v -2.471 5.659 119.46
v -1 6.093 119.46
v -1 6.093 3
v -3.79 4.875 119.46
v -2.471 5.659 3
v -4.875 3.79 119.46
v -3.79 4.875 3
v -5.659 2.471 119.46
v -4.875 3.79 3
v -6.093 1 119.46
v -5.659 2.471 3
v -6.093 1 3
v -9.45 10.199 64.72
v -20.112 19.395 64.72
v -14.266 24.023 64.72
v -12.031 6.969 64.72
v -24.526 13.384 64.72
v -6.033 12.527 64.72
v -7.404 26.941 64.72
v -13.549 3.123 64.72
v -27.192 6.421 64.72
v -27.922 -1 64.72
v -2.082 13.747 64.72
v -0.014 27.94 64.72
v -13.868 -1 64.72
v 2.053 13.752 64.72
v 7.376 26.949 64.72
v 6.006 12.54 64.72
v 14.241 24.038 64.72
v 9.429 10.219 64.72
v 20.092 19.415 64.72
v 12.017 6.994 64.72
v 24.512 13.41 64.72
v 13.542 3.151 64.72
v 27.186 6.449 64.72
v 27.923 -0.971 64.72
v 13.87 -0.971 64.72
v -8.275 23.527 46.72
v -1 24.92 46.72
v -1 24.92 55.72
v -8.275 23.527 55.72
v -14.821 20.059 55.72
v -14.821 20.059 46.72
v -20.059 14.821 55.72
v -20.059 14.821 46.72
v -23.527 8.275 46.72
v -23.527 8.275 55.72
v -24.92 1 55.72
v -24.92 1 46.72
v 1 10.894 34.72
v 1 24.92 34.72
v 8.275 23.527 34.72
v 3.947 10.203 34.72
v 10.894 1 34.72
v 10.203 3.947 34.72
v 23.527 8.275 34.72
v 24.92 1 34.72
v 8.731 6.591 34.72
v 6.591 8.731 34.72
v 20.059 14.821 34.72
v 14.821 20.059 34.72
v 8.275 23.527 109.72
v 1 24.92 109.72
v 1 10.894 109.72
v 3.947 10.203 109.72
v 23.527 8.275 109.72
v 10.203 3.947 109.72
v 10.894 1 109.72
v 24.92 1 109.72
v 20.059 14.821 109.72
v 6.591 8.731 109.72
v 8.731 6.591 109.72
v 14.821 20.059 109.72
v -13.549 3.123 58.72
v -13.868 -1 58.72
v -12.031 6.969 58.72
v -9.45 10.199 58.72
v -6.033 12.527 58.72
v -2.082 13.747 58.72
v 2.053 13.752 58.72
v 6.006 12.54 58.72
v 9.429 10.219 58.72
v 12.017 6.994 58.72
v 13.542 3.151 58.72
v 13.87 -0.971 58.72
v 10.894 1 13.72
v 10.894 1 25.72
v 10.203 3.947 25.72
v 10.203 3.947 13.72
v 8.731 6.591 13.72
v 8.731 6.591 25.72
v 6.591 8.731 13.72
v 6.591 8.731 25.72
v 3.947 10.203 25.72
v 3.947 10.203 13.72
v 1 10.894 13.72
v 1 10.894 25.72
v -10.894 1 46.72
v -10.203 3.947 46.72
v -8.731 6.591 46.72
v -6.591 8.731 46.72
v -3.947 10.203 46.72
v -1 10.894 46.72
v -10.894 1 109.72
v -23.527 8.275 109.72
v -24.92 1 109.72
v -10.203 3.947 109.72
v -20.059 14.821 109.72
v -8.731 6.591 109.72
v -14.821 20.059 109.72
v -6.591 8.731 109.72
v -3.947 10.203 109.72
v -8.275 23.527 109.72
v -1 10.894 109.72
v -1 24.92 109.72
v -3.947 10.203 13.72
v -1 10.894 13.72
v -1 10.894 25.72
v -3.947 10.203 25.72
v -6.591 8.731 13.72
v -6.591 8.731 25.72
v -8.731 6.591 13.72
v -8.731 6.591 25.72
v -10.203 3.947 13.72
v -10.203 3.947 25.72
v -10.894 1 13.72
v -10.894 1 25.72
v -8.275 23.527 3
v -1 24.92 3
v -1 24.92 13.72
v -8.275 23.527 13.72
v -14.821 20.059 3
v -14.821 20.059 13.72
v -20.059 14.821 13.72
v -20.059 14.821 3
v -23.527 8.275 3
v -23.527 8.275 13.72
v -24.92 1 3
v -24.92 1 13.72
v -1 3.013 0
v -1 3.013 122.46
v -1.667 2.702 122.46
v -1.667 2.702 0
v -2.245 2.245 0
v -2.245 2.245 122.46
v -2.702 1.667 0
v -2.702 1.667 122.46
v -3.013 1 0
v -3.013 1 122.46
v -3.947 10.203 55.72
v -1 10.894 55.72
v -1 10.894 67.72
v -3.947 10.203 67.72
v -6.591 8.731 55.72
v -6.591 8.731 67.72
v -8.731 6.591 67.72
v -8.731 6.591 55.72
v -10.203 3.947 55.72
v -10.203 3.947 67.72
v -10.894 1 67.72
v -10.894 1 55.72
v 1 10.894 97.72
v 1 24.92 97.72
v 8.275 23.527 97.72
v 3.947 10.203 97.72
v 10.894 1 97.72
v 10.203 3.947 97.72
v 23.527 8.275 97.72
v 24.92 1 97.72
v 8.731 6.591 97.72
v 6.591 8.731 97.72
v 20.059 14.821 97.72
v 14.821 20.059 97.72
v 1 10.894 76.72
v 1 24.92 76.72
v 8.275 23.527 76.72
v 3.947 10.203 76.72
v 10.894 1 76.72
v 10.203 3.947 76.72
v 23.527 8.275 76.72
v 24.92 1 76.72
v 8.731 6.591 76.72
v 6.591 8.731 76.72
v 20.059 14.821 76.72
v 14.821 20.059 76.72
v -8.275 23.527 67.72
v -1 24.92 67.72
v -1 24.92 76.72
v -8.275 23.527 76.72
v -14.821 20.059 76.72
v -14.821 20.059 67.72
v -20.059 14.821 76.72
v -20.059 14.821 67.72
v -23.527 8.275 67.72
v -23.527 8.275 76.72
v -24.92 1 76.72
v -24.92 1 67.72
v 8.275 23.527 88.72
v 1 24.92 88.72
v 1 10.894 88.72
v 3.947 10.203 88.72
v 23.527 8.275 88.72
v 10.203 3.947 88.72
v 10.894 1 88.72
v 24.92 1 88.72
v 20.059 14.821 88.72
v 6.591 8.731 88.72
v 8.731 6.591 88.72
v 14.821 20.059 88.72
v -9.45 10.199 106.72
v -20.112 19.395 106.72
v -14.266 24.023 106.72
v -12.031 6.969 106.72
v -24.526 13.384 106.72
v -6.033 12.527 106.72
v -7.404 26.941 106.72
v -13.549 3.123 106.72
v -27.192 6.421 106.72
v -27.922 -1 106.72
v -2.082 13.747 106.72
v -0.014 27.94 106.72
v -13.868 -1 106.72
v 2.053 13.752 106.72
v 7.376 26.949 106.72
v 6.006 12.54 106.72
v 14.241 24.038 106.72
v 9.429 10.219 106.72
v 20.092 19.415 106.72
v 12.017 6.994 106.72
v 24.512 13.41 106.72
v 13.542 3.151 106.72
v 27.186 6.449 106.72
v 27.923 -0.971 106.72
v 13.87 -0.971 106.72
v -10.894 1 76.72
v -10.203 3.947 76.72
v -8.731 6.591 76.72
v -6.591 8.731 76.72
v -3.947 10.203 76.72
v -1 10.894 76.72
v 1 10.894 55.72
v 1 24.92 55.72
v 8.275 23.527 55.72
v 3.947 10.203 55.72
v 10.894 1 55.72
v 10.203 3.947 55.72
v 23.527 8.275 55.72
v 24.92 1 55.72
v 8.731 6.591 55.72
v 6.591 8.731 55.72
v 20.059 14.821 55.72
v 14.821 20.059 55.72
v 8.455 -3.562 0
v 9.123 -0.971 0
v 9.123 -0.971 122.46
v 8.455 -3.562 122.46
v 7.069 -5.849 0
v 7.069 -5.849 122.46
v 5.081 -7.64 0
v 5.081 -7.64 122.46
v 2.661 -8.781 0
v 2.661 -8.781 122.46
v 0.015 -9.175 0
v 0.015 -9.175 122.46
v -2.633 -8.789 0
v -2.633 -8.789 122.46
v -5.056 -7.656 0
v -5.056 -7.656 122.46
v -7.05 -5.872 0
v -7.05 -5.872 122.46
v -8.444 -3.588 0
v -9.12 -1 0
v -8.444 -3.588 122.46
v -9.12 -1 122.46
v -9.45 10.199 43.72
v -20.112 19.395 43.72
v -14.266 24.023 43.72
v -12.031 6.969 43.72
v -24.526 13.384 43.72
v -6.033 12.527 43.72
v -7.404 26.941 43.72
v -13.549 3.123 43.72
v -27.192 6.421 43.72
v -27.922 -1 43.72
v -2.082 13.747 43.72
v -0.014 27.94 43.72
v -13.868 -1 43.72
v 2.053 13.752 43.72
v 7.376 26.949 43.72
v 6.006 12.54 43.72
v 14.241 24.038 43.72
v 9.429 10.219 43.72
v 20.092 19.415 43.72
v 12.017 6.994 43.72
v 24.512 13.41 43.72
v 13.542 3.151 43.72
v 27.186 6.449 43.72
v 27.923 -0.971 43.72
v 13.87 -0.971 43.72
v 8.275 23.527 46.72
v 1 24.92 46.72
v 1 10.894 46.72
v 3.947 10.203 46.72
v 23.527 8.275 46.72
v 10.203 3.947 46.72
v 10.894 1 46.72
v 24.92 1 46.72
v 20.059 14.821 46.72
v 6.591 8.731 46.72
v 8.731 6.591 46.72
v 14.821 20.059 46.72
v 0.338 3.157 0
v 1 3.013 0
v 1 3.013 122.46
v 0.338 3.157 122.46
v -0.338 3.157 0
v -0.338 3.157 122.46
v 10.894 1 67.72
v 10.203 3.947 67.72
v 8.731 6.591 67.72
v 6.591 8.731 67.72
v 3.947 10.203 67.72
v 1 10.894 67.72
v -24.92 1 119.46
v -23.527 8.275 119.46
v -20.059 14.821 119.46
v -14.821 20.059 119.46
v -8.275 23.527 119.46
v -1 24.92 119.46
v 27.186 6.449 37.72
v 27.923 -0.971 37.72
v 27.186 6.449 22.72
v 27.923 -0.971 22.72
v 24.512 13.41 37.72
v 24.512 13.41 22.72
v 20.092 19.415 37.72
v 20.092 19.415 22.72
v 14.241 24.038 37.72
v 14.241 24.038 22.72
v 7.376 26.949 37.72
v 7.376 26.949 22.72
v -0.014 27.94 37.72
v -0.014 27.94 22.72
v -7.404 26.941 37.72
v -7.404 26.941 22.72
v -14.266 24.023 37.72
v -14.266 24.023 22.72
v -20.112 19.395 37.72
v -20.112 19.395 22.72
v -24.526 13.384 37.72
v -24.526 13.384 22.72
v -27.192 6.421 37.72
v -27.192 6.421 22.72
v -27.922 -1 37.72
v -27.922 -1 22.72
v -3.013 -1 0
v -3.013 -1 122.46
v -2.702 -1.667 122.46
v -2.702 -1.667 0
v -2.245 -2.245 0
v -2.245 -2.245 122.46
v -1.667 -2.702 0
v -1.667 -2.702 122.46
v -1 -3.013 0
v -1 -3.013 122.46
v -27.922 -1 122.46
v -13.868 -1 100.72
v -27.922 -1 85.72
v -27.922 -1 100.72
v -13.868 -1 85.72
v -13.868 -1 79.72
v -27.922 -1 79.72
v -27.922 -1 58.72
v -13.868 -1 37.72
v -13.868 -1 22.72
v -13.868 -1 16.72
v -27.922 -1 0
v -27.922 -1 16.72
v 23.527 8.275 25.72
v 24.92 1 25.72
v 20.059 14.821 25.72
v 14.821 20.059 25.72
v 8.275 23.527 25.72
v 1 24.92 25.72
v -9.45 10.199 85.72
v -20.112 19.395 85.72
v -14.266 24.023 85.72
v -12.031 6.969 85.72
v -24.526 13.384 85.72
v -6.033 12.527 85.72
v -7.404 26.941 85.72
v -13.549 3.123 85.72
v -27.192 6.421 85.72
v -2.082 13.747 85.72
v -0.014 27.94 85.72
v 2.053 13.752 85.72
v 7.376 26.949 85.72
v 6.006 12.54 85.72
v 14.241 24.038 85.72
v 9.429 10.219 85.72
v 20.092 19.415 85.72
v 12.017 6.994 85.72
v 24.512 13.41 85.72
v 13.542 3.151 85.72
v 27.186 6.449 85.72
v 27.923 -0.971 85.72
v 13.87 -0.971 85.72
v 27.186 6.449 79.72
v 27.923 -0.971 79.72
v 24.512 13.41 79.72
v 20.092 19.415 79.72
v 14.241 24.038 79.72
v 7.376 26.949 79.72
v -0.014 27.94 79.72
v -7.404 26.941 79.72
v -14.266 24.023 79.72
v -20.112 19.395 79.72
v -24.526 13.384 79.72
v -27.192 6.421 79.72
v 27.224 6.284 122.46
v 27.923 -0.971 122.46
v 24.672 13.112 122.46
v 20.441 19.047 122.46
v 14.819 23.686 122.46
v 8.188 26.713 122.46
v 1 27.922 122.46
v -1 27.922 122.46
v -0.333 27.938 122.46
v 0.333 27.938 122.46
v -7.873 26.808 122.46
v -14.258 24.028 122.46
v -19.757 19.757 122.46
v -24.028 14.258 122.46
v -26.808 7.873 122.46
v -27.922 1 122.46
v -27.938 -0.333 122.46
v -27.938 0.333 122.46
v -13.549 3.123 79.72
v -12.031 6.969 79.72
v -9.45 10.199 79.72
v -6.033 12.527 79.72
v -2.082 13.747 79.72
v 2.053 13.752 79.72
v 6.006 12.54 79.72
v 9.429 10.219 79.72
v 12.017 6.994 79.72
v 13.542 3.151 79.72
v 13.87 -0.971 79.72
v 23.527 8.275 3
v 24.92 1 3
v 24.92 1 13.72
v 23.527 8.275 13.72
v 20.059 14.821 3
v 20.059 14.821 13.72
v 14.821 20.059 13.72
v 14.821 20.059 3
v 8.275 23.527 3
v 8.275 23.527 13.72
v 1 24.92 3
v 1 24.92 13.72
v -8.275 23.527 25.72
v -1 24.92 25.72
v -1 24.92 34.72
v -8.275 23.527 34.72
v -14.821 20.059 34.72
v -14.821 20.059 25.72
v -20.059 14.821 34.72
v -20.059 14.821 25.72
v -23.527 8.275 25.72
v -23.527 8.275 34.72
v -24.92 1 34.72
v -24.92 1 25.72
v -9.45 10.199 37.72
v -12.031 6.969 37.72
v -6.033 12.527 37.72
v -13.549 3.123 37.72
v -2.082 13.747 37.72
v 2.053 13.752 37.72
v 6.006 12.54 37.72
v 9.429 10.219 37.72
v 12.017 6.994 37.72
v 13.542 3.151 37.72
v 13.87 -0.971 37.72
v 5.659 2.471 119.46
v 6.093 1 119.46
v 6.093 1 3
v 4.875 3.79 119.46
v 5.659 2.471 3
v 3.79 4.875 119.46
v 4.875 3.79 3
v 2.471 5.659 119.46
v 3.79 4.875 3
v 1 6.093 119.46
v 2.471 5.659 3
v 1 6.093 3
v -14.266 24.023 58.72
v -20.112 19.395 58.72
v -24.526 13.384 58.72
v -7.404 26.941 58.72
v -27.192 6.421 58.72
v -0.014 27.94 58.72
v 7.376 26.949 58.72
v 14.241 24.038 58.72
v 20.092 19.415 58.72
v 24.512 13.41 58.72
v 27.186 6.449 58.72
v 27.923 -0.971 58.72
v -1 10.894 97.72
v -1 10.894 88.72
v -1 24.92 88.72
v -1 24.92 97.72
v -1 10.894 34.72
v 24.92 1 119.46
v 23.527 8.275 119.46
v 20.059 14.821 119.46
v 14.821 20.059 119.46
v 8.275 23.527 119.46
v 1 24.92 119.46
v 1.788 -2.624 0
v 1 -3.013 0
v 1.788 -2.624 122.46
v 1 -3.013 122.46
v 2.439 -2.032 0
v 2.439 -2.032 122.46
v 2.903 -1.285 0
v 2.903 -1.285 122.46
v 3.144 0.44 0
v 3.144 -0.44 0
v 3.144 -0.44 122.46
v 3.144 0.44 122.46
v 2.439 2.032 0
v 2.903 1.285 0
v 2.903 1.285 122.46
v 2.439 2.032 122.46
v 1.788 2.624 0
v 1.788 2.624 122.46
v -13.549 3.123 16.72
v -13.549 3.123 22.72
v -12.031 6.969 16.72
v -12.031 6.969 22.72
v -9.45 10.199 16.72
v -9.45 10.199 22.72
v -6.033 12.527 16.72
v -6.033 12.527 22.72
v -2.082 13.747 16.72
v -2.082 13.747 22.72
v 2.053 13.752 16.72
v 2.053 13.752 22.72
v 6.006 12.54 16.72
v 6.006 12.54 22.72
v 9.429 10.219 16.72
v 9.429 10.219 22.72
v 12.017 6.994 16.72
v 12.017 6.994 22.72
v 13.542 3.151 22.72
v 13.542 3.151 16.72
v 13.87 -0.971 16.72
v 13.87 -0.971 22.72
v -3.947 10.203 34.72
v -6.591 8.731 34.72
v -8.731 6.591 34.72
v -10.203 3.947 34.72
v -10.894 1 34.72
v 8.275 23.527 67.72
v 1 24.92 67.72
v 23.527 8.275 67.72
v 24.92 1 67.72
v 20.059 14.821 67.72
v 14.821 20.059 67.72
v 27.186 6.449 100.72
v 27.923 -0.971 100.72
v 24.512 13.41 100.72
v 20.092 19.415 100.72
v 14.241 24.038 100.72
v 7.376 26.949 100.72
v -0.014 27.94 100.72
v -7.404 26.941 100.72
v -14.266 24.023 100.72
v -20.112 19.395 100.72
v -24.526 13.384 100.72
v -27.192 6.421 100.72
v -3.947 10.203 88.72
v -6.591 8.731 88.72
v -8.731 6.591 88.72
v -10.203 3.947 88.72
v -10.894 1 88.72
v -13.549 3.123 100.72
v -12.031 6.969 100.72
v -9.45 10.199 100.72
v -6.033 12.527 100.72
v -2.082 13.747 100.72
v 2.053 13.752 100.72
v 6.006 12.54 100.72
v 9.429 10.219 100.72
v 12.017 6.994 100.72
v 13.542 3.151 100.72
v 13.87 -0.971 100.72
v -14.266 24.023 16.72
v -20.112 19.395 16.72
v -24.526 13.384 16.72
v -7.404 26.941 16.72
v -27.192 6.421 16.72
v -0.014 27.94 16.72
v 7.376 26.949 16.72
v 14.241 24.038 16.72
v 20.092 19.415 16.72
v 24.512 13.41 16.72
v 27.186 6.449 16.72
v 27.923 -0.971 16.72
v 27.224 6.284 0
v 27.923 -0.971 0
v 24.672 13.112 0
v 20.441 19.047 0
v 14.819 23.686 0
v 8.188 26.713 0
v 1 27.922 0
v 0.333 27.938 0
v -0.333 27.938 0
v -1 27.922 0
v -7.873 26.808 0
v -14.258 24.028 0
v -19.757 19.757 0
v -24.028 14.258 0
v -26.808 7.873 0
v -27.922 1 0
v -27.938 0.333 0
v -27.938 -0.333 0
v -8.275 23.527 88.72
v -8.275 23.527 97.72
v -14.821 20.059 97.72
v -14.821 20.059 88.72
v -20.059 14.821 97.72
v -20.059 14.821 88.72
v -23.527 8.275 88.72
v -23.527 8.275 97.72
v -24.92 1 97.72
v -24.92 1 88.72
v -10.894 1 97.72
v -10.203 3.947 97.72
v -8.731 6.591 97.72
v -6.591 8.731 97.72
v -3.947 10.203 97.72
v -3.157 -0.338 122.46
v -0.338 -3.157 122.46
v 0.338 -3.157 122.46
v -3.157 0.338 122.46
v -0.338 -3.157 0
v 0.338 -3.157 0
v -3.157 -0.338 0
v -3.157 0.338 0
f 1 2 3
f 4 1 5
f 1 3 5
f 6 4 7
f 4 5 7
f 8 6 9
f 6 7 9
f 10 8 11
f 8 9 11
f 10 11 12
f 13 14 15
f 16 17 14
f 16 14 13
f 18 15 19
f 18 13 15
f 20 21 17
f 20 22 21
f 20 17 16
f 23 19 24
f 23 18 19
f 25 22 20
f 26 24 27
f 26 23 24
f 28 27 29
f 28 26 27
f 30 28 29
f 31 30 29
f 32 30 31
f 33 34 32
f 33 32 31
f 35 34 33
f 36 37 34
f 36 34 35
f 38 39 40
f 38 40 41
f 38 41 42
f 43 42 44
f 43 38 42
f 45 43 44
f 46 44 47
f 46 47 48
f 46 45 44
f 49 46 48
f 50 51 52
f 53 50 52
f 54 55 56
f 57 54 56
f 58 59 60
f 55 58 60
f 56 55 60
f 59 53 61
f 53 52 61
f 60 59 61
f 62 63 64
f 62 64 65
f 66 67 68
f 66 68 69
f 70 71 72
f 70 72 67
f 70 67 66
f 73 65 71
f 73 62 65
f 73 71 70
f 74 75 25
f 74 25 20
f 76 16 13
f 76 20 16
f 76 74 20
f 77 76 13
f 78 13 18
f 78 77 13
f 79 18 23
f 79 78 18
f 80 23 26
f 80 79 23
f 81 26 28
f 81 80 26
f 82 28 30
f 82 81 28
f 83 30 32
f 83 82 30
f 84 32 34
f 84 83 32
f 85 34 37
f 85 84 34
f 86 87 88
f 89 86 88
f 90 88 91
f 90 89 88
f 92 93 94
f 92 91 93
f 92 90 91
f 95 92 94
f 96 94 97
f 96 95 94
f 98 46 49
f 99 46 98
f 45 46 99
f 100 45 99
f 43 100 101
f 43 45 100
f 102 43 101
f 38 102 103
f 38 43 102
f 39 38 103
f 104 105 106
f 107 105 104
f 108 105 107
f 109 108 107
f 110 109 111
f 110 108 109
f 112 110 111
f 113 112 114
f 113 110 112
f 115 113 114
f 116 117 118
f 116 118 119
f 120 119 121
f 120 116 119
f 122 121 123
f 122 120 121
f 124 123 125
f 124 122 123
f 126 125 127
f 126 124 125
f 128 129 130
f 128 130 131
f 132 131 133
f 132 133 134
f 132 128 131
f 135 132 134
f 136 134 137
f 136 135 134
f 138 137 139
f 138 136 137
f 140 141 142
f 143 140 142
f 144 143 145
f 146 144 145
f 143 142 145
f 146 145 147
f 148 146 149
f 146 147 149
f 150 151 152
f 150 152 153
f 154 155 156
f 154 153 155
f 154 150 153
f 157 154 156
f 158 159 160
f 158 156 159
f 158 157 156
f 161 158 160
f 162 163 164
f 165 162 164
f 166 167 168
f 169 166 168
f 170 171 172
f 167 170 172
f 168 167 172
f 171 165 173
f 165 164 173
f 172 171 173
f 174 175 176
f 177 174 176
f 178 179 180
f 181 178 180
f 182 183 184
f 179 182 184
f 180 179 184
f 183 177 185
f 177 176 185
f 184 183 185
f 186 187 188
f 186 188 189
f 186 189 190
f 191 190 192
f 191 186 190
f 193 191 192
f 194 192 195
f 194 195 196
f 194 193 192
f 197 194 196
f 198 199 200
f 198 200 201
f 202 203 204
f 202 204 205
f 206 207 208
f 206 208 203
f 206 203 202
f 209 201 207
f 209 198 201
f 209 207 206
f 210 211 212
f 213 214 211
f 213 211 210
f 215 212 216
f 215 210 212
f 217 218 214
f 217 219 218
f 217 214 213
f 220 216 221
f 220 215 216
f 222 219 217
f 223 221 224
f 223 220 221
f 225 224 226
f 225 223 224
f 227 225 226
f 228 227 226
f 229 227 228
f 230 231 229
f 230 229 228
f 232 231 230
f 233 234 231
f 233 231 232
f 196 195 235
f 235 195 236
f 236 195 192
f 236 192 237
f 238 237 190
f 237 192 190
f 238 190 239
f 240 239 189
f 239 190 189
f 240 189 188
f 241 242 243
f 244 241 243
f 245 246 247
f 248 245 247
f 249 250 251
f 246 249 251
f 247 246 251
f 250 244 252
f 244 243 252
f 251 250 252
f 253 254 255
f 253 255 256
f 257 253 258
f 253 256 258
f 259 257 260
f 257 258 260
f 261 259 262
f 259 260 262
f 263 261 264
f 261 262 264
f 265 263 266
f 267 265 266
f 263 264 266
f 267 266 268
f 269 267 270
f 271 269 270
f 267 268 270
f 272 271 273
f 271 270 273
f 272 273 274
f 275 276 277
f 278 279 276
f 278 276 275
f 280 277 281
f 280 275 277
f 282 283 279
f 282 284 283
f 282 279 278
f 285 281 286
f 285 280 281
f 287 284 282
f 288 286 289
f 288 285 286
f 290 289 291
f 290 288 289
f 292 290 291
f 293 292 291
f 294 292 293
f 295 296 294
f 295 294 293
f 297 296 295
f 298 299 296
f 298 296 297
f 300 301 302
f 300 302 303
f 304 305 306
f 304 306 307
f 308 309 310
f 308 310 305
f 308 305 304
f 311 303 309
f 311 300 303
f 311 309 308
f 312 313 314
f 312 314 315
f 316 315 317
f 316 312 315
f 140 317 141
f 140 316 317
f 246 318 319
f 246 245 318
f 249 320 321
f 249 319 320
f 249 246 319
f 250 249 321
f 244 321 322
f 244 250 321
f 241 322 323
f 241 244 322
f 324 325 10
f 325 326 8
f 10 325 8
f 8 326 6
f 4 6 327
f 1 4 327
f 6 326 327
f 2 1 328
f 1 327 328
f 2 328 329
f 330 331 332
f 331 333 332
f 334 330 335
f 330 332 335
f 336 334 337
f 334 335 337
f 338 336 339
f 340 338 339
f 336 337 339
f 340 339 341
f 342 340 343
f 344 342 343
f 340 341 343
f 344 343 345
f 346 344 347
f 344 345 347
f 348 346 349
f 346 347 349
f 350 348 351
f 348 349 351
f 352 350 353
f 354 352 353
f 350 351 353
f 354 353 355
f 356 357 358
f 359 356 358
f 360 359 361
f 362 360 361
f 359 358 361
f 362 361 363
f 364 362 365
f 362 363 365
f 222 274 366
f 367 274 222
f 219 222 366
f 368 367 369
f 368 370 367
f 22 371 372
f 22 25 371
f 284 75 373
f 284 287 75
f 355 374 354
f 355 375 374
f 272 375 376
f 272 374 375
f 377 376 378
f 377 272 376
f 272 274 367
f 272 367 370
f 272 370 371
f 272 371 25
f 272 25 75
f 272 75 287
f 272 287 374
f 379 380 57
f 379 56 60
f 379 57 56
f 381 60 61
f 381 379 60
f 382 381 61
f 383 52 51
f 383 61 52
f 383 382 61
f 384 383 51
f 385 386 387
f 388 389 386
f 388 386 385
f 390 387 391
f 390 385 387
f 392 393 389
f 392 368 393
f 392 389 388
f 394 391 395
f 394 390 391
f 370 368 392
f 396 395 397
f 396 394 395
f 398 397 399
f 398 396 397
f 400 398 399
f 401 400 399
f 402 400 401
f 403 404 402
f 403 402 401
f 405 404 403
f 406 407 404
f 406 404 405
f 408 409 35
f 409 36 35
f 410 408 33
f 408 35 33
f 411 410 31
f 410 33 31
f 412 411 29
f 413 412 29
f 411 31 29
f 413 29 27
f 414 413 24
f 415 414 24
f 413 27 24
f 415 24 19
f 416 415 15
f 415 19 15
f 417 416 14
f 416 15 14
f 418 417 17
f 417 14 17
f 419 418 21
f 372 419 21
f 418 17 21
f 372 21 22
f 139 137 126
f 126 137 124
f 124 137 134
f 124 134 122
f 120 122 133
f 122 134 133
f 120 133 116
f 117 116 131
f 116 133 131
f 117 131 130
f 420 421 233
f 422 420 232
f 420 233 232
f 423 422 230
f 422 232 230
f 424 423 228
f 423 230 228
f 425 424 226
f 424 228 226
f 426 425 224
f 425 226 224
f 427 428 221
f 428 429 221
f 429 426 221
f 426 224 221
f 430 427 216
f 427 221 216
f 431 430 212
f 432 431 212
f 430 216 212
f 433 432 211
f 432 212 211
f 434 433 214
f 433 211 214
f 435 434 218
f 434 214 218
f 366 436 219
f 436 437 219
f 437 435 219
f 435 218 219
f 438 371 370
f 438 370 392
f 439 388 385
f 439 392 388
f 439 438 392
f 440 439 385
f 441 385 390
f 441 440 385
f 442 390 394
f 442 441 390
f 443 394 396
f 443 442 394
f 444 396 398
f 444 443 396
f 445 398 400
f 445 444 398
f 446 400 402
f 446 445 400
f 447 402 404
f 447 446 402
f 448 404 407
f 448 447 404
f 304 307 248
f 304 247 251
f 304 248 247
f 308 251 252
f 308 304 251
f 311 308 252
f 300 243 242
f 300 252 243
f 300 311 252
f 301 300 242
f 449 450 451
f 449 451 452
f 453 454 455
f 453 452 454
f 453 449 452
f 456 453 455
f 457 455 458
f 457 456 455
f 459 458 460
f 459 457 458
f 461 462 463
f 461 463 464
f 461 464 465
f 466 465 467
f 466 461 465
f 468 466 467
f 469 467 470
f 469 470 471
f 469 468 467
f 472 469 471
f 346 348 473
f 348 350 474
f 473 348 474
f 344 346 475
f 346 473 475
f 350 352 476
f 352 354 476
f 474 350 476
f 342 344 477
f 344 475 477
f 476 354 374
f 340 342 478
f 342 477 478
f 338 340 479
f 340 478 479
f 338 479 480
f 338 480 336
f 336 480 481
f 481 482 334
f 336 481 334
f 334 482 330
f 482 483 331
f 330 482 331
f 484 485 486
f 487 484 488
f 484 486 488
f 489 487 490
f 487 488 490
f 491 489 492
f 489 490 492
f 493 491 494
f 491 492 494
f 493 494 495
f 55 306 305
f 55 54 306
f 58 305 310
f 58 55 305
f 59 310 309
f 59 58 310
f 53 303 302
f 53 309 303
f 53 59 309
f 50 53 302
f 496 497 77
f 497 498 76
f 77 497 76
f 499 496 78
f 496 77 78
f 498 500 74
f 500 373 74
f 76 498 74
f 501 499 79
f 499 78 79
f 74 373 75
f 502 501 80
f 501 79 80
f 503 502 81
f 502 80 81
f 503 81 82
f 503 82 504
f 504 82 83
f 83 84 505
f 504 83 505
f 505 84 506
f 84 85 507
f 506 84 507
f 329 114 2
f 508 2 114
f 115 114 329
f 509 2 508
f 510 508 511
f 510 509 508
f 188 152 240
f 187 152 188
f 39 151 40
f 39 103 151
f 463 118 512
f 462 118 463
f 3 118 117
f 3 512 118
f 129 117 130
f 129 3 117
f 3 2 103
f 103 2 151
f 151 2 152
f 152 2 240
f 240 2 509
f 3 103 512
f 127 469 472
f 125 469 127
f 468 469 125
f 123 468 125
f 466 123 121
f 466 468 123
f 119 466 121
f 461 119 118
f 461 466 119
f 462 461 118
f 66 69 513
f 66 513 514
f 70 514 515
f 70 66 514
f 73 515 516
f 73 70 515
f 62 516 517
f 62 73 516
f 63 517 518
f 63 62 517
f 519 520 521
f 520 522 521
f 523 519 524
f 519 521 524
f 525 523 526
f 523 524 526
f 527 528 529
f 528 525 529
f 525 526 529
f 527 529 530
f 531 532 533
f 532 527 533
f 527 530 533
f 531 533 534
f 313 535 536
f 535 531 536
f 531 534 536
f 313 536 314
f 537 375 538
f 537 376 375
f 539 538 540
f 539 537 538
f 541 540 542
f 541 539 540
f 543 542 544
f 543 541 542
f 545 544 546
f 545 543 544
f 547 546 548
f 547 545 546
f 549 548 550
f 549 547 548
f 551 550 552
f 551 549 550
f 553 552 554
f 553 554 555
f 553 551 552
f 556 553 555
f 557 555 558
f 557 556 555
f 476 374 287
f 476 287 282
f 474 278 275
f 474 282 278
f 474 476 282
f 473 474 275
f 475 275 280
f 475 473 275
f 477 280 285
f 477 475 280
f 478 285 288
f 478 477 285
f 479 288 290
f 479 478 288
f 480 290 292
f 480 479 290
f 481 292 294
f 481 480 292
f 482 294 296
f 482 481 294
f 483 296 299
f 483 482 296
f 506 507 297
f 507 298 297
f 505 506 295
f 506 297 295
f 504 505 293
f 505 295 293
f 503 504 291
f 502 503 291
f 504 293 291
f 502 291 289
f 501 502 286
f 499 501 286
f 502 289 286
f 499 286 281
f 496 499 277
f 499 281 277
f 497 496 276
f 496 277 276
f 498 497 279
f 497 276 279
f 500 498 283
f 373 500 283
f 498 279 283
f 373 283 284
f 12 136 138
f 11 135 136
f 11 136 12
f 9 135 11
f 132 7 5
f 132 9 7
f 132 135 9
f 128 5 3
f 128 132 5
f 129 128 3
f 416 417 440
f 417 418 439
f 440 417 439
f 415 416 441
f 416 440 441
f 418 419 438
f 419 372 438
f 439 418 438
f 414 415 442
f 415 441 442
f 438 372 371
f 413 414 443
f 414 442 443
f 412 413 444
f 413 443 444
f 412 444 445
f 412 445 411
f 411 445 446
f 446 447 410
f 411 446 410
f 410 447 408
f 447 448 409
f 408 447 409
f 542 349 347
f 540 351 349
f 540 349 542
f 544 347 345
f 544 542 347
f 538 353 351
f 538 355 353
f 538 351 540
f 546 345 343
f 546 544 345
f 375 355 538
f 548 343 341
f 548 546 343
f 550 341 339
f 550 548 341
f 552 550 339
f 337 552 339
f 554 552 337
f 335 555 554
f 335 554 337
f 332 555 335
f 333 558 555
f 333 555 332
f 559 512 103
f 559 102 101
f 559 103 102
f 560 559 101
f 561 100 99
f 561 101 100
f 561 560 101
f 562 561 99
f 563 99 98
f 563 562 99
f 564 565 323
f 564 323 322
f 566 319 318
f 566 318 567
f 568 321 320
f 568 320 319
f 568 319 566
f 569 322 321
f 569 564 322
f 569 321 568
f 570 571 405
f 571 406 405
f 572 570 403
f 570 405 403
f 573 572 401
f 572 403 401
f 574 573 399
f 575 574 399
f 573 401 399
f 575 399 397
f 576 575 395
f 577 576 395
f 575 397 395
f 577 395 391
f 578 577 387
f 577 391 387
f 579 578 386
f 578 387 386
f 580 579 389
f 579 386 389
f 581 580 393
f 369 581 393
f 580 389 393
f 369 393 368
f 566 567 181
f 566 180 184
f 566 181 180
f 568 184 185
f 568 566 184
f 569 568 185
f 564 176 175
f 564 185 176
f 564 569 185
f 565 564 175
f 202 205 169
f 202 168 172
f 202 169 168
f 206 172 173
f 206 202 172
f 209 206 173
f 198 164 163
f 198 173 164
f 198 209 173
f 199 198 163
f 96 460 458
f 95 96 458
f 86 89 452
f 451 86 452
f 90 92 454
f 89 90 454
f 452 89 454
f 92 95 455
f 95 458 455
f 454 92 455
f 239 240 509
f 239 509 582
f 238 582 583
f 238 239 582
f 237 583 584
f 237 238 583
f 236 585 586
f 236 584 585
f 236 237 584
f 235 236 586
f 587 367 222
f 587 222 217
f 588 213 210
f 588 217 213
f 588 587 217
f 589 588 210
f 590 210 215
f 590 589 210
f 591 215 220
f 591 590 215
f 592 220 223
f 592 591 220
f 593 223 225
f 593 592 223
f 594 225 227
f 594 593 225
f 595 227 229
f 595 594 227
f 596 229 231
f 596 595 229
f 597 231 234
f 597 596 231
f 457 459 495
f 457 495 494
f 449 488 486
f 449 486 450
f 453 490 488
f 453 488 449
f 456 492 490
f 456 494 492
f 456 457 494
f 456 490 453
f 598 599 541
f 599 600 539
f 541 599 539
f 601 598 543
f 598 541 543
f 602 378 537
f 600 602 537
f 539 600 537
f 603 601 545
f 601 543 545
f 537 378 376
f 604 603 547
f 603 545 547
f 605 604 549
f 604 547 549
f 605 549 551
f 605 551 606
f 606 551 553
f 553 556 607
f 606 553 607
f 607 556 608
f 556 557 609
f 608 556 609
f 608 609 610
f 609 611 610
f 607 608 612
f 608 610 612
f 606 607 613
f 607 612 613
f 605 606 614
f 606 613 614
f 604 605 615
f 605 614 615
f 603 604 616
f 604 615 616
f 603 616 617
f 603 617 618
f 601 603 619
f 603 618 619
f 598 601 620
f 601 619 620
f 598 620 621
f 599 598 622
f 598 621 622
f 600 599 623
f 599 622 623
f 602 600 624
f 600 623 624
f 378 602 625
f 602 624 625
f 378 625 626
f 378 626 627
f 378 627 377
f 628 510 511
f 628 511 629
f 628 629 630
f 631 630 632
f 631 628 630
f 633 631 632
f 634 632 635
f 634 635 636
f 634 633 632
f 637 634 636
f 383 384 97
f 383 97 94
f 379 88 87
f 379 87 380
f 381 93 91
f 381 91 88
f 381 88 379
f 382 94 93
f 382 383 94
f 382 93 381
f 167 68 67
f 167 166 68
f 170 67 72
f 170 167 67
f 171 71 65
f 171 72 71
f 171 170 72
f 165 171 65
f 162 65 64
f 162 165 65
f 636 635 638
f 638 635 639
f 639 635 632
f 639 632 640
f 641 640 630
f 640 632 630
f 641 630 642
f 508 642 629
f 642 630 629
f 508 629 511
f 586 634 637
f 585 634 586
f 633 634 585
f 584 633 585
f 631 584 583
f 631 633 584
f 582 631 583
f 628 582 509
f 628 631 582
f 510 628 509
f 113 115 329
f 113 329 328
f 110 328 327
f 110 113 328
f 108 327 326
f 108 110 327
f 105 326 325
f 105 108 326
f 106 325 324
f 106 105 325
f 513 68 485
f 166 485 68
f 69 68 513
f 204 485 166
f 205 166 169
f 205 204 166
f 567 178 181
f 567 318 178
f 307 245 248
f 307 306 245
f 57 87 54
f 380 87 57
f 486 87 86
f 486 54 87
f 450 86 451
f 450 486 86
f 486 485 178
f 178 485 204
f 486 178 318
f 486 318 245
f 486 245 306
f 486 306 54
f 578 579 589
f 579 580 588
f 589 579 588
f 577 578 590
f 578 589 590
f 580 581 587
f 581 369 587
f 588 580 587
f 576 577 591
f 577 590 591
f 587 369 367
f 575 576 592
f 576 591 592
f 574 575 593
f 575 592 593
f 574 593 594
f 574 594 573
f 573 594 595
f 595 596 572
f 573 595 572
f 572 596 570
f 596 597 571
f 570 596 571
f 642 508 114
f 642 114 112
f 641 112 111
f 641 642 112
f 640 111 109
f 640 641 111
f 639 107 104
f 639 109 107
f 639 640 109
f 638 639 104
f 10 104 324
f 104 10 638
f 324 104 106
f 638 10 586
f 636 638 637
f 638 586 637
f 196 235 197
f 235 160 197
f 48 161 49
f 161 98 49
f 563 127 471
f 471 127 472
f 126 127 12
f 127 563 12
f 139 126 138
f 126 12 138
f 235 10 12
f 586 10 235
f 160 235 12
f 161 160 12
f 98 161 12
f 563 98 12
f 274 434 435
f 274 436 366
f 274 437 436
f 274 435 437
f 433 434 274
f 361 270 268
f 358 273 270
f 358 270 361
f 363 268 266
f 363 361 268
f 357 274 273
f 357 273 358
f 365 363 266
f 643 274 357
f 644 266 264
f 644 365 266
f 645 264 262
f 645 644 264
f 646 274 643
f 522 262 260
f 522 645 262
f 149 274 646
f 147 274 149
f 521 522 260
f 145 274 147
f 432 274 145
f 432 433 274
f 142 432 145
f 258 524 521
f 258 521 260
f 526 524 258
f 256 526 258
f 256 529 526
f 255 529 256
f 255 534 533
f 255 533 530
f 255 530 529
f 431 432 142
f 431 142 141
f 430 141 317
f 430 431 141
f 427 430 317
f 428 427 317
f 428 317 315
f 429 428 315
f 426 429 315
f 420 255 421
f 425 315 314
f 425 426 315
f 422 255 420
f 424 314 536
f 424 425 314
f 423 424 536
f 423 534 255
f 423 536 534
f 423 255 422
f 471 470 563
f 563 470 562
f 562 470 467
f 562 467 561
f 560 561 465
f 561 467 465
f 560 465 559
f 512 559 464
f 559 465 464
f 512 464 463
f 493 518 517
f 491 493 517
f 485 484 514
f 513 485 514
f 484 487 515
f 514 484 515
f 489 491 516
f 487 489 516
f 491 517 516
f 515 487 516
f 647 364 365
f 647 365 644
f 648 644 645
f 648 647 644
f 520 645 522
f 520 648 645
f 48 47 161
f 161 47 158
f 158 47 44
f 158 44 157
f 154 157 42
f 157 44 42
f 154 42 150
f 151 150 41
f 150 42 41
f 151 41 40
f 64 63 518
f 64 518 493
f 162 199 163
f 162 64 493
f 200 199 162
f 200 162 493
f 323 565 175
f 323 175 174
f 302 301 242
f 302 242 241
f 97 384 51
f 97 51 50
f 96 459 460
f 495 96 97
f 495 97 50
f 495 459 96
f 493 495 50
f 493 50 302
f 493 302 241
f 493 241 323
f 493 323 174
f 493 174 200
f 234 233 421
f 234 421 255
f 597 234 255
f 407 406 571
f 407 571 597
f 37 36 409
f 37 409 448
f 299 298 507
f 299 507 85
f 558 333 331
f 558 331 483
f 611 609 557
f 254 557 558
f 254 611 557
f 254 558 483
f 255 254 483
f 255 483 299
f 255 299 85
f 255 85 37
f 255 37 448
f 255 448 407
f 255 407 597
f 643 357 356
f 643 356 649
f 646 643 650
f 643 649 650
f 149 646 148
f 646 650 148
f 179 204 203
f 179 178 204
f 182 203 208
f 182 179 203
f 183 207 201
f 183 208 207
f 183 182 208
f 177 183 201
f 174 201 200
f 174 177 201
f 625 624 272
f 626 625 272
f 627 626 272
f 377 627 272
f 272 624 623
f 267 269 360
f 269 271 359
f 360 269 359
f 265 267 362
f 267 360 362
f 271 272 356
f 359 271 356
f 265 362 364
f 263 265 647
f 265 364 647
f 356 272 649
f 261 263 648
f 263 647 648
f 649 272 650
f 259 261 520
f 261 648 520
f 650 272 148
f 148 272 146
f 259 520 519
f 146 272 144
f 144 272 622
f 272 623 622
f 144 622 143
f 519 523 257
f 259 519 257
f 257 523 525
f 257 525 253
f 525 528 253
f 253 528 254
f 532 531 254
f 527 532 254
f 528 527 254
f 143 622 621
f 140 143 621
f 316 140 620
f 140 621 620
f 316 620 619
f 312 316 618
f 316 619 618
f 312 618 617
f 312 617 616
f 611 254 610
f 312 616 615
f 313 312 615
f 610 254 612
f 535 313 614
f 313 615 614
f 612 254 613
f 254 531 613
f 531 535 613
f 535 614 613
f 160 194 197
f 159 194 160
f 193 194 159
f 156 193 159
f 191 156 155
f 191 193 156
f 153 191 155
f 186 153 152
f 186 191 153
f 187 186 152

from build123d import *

# Parameters (mm, degrees)
SKETCH3_R            = 27.94
BOSS_EXTRUDE2_DEPTH  = 122.46
SKETCH5_R            = 3.175
CUT_EXTRUDE1_DEPTH   = 129.676877488
SKETCH4_W            = 14
SKETCH4_H            = 6
SHELL1_START         = 3
SHELL1_OUTLINE_R     = 10.94
SHELL1_OUTLINE_R_2   = 6.175
SHELL1_DEPTH         = 116.46
SHELL1_2_OUTLINE_R   = 24.94
SHELL1_2_OUTLINE_R_2 = 10.94
SHELL1_2_DEPTH       = 10.72
SHELL1_START_2       = 109.72
SHELL1_3_OUTLINE_R   = 24.94
SHELL1_3_OUTLINE_R_2 = 10.94
SHELL1_3_DEPTH       = 9.74
SHELL1_START_3       = 25.72
SHELL1_4_OUTLINE_R   = 24.94
SHELL1_4_OUTLINE_R_2 = 10.94
SHELL1_4_DEPTH       = 9
SHELL1_START_4       = 46.72
SHELL1_5_OUTLINE_R   = 24.94
SHELL1_5_OUTLINE_R_2 = 10.94
SHELL1_5_DEPTH       = 9
SHELL1_START_5       = 67.72
SHELL1_6_OUTLINE_R   = 24.94
SHELL1_6_OUTLINE_R_2 = 10.94
SHELL1_6_DEPTH       = 9
SHELL1_START_6       = 88.72
SHELL1_7_OUTLINE_R   = 24.94
SHELL1_7_OUTLINE_R_2 = 10.94
SHELL1_7_DEPTH       = 9
BOSS_EXTRUDE3_REACH  = 130.677
SKETCH13_W           = 16.483162312
SKETCH13_H           = 6
CUT_EXTRUDE3_DEPTH   = 123
BOSS_EXTRUDE5_START  = -122.46
BOSS_EXTRUDE5_DEPTH  = 122.46


# Read off the part's stored shape, not the designer's step: Shell1
with BuildPart() as part:
    # Sketch3 → Boss-Extrude2 (new body)
    with BuildSketch(Plane.XY):
        Circle(SKETCH3_R)
    extrude(amount=BOSS_EXTRUDE2_DEPTH)

    # Sketch5 → Cut-Extrude1 (cut, through all)
    with BuildSketch(Plane.XY.offset(122.46)):
        Circle(SKETCH5_R)
    extrude(amount=-CUT_EXTRUDE1_DEPTH, mode=Mode.SUBTRACT)

    # Sketch4 → Cut-Revolve1 (revolve, cut)
    with BuildSketch(Plane(origin=(0, 0, 0), x_dir=(1, 0, 0), z_dir=(0, 1, 0)), mode=Mode.PRIVATE) as cut_revolve1_sk:
        with Locations((-20.94, -103.72)):
            Rectangle(SKETCH4_W, SKETCH4_H)
        with Locations((-20.94, -82.72)):
            Rectangle(SKETCH4_W, SKETCH4_H)
        with Locations((-20.94, -61.72)):
            Rectangle(SKETCH4_W, SKETCH4_H)
        with Locations((-20.94, -40.72)):
            Rectangle(SKETCH4_W, SKETCH4_H)
        with Locations((-20.94, -19.72)):
            Rectangle(SKETCH4_W, SKETCH4_H)
    revolve(cut_revolve1_sk.sketch.rotate(Axis((0, 0, 122.46), (0, 0, -1)), 180), axis=Axis((0, 0, 122.46), (0, 0, -1)), mode=Mode.SUBTRACT)

    # Shell1 outline → Shell1 (cut)
    with BuildSketch(Plane.XY.offset(SHELL1_START)):
        Circle(SHELL1_OUTLINE_R)
        Circle(SHELL1_OUTLINE_R_2, mode=Mode.SUBTRACT)
    extrude(amount=SHELL1_DEPTH, mode=Mode.SUBTRACT)

    # Shell1 2 outline → Shell1 2 (cut)
    with BuildSketch(Plane.XY.offset(SHELL1_START)):
        Circle(SHELL1_2_OUTLINE_R)
        Circle(SHELL1_2_OUTLINE_R_2, mode=Mode.SUBTRACT)
    extrude(amount=SHELL1_2_DEPTH, mode=Mode.SUBTRACT)

    # Shell1 3 outline → Shell1 3 (cut)
    with BuildSketch(Plane.XY.offset(SHELL1_START_2)):
        Circle(SHELL1_3_OUTLINE_R)
        Circle(SHELL1_3_OUTLINE_R_2, mode=Mode.SUBTRACT)
    extrude(amount=SHELL1_3_DEPTH, mode=Mode.SUBTRACT)

    # Shell1 4 outline → Shell1 4 (cut)
    with BuildSketch(Plane.XY.offset(SHELL1_START_3)):
        Circle(SHELL1_4_OUTLINE_R)
        Circle(SHELL1_4_OUTLINE_R_2, mode=Mode.SUBTRACT)
    extrude(amount=SHELL1_4_DEPTH, mode=Mode.SUBTRACT)

    # Shell1 5 outline → Shell1 5 (cut)
    with BuildSketch(Plane.XY.offset(SHELL1_START_4)):
        Circle(SHELL1_5_OUTLINE_R)
        Circle(SHELL1_5_OUTLINE_R_2, mode=Mode.SUBTRACT)
    extrude(amount=SHELL1_5_DEPTH, mode=Mode.SUBTRACT)

    # Shell1 6 outline → Shell1 6 (cut)
    with BuildSketch(Plane.XY.offset(SHELL1_START_5)):
        Circle(SHELL1_6_OUTLINE_R)
        Circle(SHELL1_6_OUTLINE_R_2, mode=Mode.SUBTRACT)
    extrude(amount=SHELL1_6_DEPTH, mode=Mode.SUBTRACT)

    # Shell1 7 outline → Shell1 7 (cut)
    with BuildSketch(Plane.XY.offset(SHELL1_START_6)):
        Circle(SHELL1_7_OUTLINE_R)
        Circle(SHELL1_7_OUTLINE_R_2, mode=Mode.SUBTRACT)
    extrude(amount=SHELL1_7_DEPTH, mode=Mode.SUBTRACT)

    # Boss-Extrude3: up to this face of the body (flat: up to its plane)
    boss_extrude3_end = Plane(part.part.faces().sort_by_distance((-27.149737461, 0, 122.46))[0])
    # Sketch10 → Boss-Extrude3 (add, up to the picked face)
    with BuildSketch(Plane(origin=(0, 0, 0), x_dir=(-1, 0, 0), z_dir=(0, 0, -1)), mode=Mode.PRIVATE) as boss_extrude3_sk1:
        with BuildLine():
            Line((-1, 27.922098775), (-1, 3.01340754))
            ThreePointArc((-1, 3.01340754), (0, 3.175), (1, 3.01340754))
            Line((1, 3.01340754), (1, 27.922098775))
            ThreePointArc((1, 27.922098775), (0, 27.94), (-1, 27.922098775))
        make_face()
    boss_extrude3_tool1 = split(extrude(boss_extrude3_sk1.sketch, amount=-BOSS_EXTRUDE3_REACH, mode=Mode.PRIVATE), bisect_by=boss_extrude3_end, keep=Keep.BOTH, mode=Mode.PRIVATE)
    # Sketch10 → Boss-Extrude3 (add, up to the picked face)
    with BuildSketch(Plane(origin=(0, 0, 0), x_dir=(-1, 0, 0), z_dir=(0, 0, -1)), mode=Mode.PRIVATE) as boss_extrude3_sk2:
        with BuildLine():
            Line((3.01340754, 1), (27.922098775, 1))
            ThreePointArc((27.922098775, 1), (27.94, 0), (27.922098775, -1))
            Line((27.922098775, -1), (3.01340754, -1))
            ThreePointArc((3.01340754, -1), (3.175, 0), (3.01340754, 1))
        make_face()
    boss_extrude3_tool2 = split(extrude(boss_extrude3_sk2.sketch, amount=-BOSS_EXTRUDE3_REACH, mode=Mode.PRIVATE), bisect_by=boss_extrude3_end, keep=Keep.BOTH, mode=Mode.PRIVATE)
    # Sketch10 → Boss-Extrude3 (add, up to the picked face)
    with BuildSketch(Plane(origin=(0, 0, 0), x_dir=(-1, 0, 0), z_dir=(0, 0, -1)), mode=Mode.PRIVATE) as boss_extrude3_sk3:
        with BuildLine():
            Line((-1, -3.01340754), (-1, -27.922098775))
            ThreePointArc((-1, -27.922098775), (0, -27.94), (1, -27.922098775))
            Line((1, -27.922098775), (1, -3.01340754))
            ThreePointArc((1, -3.01340754), (0, -3.175), (-1, -3.01340754))
        make_face()
    boss_extrude3_tool3 = split(extrude(boss_extrude3_sk3.sketch, amount=-BOSS_EXTRUDE3_REACH, mode=Mode.PRIVATE), bisect_by=boss_extrude3_end, keep=Keep.BOTH, mode=Mode.PRIVATE)
    # Sketch10 → Boss-Extrude3 (add, up to the picked face)
    with BuildSketch(Plane(origin=(0, 0, 0), x_dir=(-1, 0, 0), z_dir=(0, 0, -1)), mode=Mode.PRIVATE) as boss_extrude3_sk4:
        with BuildLine():
            Line((-27.922098775, -1), (-3.01340754, -1))
            ThreePointArc((-3.01340754, -1), (-3.175, 0), (-3.01340754, 1))
            Line((-3.01340754, 1), (-27.922098775, 1))
            ThreePointArc((-27.922098775, 1), (-27.94, 0), (-27.922098775, -1))
        make_face()
    boss_extrude3_tool4 = split(extrude(boss_extrude3_sk4.sketch, amount=-BOSS_EXTRUDE3_REACH, mode=Mode.PRIVATE), bisect_by=boss_extrude3_end, keep=Keep.BOTH, mode=Mode.PRIVATE)
    add(boss_extrude3_tool1.solids().sort_by(Axis((0, 15.527819, 0), (0, 0, 1)))[0])
    add(boss_extrude3_tool2.solids().sort_by(Axis((-15.527819, 0, 0), (0, 0, 1)))[0])
    add(boss_extrude3_tool3.solids().sort_by(Axis((0, -15.527819, 0), (0, 0, 1)))[0])
    add(boss_extrude3_tool4.solids().sort_by(Axis((15.527819, 0, 0), (0, 0, 1)))[0])

    # Sketch13 → Cut-Revolve2 (revolve, cut)
    with BuildSketch(Plane(origin=(0, 0, 0), x_dir=(1, 0, 0), z_dir=(0, 1, 0)), mode=Mode.PRIVATE) as cut_revolve2_sk:
        with Locations((-22.145666886, -40.72)):
            Rectangle(SKETCH13_W, SKETCH13_H)
        with Locations((-22.145666886, -19.72)):
            Rectangle(SKETCH13_W, SKETCH13_H)
        with Locations((-22.145666886, -61.72)):
            Rectangle(SKETCH13_W, SKETCH13_H)
        with Locations((-22.145666886, -82.72)):
            Rectangle(SKETCH13_W, SKETCH13_H)
        with Locations((-22.145666886, -103.72)):
            Rectangle(SKETCH13_W, SKETCH13_H)
    revolve(cut_revolve2_sk.sketch.rotate(Axis((0, 0, 121.588746248), (0, 0, -1)), 180), axis=Axis((0, 0, 121.588746248), (0, 0, -1)), mode=Mode.SUBTRACT)

    # Sketch16 → Cut-Extrude3 (cut)
    with BuildSketch(Plane(origin=(0, 0, 0), x_dir=(-1, 0, 0), z_dir=(0, 0, -1))):
        with BuildLine():
            Line((-27.923120749, -0.971044624), (-6.098171639, -0.971044624))
            ThreePointArc((-6.098171639, -0.971044624), (-0.014665674, -6.174982584), (6.093490379, -1))
            Line((6.093490379, -1), (27.922098775, -1))
            ThreePointArc((27.922098775, -1), (-0.014486703, -27.939996244), (-27.923120749, -0.971044624))
        make_face()
    extrude(amount=-CUT_EXTRUDE3_DEPTH, mode=Mode.SUBTRACT)

    # Sketch18 → Boss-Extrude5 (add)
    with BuildSketch(Plane(origin=(0, 0, 0), x_dir=(-1, 0, 0), z_dir=(0, 0, -1)).offset(BOSS_EXTRUDE5_START)):
        with BuildLine():
            Line((-3.175, 0), (-9.175, 0))
            ThreePointArc((-9.175, 0), (0, -9.175), (9.175, 0))
            Line((9.175, 0), (3.175, 0))
            ThreePointArc((3.175, 0), (0, -3.175), (-3.175, 0))
        make_face()
    extrude(amount=BOSS_EXTRUDE5_DEPTH)


solid = part.part
